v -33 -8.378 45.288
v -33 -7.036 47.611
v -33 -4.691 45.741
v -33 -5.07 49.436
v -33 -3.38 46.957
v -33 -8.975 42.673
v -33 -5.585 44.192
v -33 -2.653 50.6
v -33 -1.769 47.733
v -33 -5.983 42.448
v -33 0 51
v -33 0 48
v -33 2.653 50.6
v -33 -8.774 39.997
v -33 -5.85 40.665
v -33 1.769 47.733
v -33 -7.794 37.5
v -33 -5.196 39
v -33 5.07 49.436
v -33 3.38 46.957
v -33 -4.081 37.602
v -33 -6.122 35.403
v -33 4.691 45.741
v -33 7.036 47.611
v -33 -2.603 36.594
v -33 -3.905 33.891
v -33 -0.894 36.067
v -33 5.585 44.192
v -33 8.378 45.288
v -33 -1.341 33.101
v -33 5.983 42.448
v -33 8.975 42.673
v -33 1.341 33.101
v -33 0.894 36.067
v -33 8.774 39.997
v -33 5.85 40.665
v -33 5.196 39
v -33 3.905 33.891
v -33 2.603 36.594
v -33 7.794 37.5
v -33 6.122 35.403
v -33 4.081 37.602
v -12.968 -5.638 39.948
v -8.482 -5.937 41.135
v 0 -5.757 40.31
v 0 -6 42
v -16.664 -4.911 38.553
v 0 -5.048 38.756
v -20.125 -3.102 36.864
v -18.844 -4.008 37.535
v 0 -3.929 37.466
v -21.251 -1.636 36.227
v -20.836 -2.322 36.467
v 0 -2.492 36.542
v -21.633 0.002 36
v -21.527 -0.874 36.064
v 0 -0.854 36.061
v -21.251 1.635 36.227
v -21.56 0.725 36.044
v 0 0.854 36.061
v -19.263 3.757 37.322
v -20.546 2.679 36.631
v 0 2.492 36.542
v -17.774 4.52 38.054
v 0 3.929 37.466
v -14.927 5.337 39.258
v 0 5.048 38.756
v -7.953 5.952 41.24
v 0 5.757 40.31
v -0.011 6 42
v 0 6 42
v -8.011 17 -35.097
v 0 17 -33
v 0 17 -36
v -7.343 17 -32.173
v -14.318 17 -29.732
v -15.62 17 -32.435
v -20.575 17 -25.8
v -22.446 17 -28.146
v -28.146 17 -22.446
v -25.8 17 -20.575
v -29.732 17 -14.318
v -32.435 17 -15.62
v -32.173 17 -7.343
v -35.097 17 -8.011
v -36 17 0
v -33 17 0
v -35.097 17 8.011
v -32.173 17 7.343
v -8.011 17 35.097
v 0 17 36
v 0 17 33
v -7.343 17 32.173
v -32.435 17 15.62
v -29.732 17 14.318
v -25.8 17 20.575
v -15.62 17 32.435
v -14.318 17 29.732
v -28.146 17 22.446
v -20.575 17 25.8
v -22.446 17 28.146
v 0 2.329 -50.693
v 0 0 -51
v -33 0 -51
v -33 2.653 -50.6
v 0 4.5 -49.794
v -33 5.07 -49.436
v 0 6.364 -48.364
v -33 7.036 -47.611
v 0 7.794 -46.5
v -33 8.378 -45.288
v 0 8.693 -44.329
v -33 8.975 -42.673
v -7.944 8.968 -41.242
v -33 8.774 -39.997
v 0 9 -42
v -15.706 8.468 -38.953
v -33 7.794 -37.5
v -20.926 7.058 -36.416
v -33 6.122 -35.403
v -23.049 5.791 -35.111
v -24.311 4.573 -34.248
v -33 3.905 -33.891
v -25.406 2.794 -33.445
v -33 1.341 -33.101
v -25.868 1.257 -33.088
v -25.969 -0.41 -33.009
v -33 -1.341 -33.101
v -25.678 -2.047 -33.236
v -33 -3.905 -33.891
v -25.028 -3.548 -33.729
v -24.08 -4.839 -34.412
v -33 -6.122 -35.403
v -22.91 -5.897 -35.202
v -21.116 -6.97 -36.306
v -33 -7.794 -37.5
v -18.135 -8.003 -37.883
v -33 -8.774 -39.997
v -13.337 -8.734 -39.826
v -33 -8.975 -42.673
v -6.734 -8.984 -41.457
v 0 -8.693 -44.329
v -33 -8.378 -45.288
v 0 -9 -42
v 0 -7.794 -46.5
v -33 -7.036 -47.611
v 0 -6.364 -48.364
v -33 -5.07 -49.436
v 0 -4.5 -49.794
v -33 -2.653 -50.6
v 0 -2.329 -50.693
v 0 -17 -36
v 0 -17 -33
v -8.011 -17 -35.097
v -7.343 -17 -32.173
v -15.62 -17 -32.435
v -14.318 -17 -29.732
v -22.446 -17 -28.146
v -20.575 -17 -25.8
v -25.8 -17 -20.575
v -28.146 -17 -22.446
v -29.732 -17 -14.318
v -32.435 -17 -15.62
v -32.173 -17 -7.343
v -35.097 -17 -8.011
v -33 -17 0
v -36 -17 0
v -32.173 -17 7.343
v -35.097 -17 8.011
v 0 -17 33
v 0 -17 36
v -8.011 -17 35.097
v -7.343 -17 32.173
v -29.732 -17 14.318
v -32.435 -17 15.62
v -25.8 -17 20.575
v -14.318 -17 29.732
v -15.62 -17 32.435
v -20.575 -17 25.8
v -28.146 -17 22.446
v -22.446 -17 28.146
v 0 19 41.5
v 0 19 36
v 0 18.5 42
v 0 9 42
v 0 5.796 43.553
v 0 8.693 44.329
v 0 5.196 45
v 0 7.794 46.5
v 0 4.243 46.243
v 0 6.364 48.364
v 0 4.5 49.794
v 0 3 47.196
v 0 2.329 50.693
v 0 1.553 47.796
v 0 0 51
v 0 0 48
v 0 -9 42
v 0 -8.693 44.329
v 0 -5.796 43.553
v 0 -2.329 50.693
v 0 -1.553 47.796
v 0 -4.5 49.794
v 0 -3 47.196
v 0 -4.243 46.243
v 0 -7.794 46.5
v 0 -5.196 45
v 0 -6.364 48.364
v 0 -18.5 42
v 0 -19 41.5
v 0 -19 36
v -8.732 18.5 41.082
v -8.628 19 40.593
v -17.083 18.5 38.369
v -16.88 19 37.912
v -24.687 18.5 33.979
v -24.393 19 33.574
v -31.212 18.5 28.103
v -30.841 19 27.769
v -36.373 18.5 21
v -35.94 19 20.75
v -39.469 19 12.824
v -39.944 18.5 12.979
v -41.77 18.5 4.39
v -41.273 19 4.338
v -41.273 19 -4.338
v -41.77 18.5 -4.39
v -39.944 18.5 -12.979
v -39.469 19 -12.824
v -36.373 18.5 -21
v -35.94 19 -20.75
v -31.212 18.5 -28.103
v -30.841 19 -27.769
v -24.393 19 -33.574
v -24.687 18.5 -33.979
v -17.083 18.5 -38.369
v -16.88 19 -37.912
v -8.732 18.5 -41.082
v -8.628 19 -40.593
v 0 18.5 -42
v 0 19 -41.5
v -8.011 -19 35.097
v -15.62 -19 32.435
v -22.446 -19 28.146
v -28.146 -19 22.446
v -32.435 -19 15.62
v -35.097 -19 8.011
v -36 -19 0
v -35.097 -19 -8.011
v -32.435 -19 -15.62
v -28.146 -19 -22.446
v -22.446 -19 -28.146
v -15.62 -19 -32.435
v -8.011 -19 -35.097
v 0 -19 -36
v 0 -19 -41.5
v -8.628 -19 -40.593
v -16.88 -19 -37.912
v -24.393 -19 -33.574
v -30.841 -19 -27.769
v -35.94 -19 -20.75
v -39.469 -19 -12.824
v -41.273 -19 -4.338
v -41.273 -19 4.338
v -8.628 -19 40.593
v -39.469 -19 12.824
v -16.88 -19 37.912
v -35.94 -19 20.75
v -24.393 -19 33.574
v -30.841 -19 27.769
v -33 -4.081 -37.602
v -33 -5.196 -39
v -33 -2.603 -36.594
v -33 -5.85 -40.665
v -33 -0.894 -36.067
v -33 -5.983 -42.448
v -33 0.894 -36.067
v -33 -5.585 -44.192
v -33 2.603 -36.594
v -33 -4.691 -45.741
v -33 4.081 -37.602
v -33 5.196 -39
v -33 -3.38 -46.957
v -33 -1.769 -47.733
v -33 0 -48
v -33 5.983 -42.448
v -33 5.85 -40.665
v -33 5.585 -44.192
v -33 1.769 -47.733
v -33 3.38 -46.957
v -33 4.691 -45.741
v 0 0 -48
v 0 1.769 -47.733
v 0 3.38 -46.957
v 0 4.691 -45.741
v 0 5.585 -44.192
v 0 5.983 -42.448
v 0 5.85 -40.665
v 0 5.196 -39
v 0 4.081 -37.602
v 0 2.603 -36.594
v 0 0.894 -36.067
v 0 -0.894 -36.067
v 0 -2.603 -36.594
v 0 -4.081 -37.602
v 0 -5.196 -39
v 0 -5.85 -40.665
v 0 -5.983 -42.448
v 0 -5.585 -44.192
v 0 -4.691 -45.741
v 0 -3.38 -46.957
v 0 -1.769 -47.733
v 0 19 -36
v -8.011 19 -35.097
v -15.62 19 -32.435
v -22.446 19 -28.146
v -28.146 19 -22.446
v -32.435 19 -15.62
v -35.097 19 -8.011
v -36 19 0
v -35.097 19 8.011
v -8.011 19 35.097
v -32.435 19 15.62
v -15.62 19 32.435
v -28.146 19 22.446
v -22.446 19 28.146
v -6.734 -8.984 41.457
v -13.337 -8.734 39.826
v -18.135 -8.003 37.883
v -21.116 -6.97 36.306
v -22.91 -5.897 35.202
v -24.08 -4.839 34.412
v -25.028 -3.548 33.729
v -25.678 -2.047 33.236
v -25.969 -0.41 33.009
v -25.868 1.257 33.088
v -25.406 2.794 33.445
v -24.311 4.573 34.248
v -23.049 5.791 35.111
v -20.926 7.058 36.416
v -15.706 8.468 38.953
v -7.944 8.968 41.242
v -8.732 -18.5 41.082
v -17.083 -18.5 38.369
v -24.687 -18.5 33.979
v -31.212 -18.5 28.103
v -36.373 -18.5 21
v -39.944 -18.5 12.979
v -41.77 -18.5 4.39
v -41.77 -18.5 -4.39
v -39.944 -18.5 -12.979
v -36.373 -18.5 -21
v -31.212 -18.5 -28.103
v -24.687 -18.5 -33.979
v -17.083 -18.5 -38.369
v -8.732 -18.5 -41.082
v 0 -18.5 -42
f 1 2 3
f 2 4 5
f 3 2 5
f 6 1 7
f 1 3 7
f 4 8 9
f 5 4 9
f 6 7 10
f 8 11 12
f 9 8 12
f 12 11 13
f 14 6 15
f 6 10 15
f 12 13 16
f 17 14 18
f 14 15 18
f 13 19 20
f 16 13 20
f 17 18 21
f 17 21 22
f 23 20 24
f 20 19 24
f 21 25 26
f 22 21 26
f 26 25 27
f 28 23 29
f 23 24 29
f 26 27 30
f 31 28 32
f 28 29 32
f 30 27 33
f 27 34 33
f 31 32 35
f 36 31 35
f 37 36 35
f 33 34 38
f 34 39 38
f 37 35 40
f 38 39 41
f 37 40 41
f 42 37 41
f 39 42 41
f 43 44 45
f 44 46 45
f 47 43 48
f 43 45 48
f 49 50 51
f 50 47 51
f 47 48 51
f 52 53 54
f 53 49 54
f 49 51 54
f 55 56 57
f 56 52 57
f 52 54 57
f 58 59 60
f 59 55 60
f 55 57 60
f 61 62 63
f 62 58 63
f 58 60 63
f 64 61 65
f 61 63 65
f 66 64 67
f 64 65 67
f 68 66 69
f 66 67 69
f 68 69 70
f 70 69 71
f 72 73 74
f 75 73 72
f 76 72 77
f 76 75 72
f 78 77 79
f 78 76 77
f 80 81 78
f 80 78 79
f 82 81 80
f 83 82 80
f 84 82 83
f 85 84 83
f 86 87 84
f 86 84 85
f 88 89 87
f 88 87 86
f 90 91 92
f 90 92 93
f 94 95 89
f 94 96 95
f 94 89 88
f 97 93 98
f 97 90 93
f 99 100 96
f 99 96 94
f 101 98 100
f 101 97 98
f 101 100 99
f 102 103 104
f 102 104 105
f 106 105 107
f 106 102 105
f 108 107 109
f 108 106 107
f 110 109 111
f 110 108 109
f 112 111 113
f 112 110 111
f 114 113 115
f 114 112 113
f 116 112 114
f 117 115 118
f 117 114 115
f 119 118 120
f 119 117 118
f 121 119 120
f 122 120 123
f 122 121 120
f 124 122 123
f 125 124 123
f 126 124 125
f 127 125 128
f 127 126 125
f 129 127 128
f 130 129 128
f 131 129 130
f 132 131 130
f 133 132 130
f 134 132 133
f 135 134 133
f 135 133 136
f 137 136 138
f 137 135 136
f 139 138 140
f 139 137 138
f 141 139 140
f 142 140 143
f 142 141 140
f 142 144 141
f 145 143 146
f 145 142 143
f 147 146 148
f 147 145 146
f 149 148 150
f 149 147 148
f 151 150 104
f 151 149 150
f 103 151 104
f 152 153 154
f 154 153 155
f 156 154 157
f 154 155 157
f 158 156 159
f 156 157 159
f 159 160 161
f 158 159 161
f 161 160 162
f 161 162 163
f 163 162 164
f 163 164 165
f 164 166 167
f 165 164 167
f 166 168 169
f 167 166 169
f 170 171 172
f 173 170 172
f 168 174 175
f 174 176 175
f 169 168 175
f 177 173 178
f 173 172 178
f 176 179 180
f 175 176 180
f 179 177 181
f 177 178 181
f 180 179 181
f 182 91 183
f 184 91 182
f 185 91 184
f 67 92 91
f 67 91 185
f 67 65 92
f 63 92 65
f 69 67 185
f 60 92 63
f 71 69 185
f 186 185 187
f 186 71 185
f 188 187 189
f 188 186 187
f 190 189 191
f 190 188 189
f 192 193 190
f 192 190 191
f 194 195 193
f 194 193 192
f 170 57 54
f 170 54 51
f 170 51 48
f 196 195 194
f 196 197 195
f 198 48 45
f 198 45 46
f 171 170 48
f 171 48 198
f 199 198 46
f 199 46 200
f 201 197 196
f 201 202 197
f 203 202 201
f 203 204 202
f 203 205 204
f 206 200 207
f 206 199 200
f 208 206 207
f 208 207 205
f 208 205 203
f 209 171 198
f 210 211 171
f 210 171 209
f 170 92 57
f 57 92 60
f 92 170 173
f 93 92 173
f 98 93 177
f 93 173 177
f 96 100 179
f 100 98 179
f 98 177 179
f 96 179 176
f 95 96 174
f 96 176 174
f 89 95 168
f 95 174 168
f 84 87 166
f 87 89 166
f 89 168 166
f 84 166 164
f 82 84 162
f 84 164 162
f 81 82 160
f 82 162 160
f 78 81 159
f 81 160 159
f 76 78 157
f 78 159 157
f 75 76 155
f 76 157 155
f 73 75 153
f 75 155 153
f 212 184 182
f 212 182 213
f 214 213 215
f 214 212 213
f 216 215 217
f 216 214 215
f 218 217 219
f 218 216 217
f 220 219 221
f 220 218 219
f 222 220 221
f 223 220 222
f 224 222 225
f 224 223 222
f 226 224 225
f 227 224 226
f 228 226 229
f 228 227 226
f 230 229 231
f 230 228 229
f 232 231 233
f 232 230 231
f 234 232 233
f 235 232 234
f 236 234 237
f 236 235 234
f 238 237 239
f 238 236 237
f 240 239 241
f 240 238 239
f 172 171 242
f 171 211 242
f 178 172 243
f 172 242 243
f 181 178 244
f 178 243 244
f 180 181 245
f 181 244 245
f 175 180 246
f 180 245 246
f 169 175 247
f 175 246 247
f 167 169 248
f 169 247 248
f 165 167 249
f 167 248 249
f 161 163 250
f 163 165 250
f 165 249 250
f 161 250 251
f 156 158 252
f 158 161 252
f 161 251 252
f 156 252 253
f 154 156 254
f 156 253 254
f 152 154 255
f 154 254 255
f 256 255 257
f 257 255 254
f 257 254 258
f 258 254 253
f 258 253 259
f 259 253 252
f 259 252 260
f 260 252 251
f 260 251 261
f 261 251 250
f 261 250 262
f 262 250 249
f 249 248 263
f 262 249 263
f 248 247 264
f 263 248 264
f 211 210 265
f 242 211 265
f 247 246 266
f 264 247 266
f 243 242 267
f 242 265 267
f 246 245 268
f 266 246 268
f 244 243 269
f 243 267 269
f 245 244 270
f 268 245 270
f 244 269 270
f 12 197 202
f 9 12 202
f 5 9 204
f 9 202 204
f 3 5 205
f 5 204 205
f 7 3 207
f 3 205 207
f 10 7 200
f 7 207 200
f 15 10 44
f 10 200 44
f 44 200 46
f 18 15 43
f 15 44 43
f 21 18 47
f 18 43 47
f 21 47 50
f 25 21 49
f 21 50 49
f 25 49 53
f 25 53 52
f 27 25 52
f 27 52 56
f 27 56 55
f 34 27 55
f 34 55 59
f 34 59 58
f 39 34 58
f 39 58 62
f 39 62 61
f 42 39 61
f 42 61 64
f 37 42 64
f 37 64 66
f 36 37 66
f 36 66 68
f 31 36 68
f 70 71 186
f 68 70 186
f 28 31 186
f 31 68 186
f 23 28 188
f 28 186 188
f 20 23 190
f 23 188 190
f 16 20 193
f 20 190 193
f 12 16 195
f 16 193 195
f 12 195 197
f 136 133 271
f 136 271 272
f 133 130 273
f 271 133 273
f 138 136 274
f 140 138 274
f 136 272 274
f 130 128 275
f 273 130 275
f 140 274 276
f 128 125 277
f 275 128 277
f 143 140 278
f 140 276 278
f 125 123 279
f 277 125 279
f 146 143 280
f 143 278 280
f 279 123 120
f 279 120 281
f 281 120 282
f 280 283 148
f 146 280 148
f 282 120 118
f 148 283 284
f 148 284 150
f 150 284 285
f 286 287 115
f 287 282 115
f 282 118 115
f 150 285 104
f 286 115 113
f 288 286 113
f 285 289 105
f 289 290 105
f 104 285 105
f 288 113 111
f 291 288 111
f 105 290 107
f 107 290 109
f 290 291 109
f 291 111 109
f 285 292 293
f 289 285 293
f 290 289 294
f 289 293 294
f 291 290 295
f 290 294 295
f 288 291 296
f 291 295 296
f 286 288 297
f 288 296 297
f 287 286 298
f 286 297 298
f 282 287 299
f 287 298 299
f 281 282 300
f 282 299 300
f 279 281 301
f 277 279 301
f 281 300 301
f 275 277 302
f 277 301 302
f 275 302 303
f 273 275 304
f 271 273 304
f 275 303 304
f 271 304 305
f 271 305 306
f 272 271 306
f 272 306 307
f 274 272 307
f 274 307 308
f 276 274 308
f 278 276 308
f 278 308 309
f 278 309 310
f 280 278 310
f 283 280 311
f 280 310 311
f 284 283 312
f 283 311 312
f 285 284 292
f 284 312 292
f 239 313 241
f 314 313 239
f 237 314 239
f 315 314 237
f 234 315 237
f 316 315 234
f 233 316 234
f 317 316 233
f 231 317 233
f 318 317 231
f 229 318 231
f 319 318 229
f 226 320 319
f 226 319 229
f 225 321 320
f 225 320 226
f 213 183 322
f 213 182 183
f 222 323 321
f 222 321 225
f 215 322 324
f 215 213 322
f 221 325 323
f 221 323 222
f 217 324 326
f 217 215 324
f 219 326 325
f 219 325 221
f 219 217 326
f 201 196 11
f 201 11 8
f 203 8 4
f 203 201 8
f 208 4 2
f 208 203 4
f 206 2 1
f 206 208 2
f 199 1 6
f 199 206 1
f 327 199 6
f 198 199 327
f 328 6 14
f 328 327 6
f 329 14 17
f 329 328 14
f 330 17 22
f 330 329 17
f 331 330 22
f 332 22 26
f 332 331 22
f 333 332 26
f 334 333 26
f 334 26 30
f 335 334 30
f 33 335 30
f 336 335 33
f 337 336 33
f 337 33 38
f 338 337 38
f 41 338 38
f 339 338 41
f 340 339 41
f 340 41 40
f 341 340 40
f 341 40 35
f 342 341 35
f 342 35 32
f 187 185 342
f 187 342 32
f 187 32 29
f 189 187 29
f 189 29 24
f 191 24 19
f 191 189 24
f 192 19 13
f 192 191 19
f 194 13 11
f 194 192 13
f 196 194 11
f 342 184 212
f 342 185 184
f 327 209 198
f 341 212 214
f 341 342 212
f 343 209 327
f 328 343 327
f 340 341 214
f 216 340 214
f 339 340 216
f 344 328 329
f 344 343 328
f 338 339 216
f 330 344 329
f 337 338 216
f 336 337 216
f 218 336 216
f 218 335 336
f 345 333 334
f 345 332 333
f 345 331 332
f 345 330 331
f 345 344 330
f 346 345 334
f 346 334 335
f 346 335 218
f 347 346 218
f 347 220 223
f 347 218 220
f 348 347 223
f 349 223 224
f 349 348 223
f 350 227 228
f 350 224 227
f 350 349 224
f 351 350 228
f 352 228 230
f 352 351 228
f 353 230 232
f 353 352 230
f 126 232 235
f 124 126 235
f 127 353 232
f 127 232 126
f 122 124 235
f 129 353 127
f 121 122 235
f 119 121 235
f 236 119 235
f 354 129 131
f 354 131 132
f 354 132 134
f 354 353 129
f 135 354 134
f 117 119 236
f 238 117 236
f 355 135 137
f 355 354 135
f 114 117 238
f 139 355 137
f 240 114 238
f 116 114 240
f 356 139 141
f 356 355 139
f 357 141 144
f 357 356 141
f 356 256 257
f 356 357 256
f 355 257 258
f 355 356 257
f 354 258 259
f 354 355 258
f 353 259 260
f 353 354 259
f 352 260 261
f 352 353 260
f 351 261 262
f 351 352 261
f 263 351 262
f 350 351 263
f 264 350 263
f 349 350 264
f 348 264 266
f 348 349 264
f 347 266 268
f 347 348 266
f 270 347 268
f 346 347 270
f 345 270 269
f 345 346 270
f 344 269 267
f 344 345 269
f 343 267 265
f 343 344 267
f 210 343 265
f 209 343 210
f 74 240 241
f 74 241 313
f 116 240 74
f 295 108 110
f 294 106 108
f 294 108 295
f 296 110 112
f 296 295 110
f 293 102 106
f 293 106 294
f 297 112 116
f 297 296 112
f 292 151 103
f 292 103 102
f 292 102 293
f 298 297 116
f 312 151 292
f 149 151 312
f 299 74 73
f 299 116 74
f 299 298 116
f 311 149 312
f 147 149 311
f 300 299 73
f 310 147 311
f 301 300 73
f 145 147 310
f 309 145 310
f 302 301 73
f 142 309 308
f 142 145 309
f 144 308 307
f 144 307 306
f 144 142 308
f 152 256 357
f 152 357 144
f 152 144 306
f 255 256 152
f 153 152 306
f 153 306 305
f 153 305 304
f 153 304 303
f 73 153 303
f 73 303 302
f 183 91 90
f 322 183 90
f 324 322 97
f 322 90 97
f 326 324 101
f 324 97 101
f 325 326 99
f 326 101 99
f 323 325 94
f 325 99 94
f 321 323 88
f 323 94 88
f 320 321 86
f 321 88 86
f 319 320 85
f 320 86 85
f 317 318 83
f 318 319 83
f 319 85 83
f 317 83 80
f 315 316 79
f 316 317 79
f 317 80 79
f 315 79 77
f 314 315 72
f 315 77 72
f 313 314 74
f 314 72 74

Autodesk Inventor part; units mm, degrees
ref_plane "YZ Plane" through (0, 0, 0) normal (1, 0, 0) x (0, 1, 0)
ref_plane "XZ Plane" through (0, 0, 0) normal (0, 1, 0) x (-1, 0, 0)
ref_plane "XY Plane" through (0, 0, 0) normal (0, 0, 1) x (1, 0, 0)
sketch "Boceto1" plane through (0, 0, 0) normal (0, 1, 0) x (-1, 0, 0)
  arc A0 (0, -33) -> (0, 33) centre (0, 0) ccw
  arc A1 (0, -36) -> (0, 36) centre (0, 0) ccw
  arc A2 (0, -42) -> (0, 42) centre (0, 0) ccw
  line L0 (0, -42) -> (0, 42)
  circle A3 centre (177, 0) radius 22
  circle A4 centre (177, 0) radius 18
  line L1 (159.2518, -13) -> (39.9375, -13)
  line L2 (159.2518, 13) -> (39.9375, 13)
  line L3 (139, 0) -> (57, 0) construction
  line L4 (139, 8) -> (57, 8)
  line L5 (57, -8) -> (139, -8)
  arc A5 (139, -8) -> (139, 8) centre (139, 0) ccw
  arc A6 (57, 8) -> (57, -8) centre (57, 0) ccw
  point P0 (98, 0)
  dimension "d0" = 66
  dimension "d1" = 72
  dimension "d2" = 84
  dimension "d3" = 44
  dimension "d4" = 177
  dimension "d5" = 36
  dimension "d6" = 26
  dimension "d7" = 41
  dimension "d8" = 16
  dimension "d9" = 57
extrude "Extrusión1" add sketch "Boceto1" along normal mid plane 38 contours A1 L0 A2
extrude "Extrusión2" add sketch "Boceto1" along normal mid plane 34 contours A0 L0 A1
sketch "Boceto2" plane through (0, -19, -42) normal (1, 0, 0) x (0, 0, -1)
  line L0 (0, 0) -> (0, 38) projected
  circle A0 centre (0, 19) radius 9
  circle A1 centre (0, 19) radius 6
  point P0 (-42, 19)
  point P1 (0, 25)
  point P2 (0, 13)
  dimension "d18" = 18
  dimension "d19" = 12
extrude "Extrusión5" cut sketch "Boceto2" against normal up to surface contours A1 L0 picked at (-1.87, 18.2908)
extrude "Extrusión6" add sketch "Boceto2" against normal blind 33 contours A0 L0 A1 | L0 A1 A0
mirror "Simetría1" about plane through (0, 0, 0) normal (0, 0, 1) of "Extrusión6", "Extrusión5"
chamfer "Chaflán2" distance 0.5 angle 45 2 edges at (-42, 19, 0) (-42, -19, 0)
properties part number "EM-004" material "Acero, alta resistencia, aleación baja"
